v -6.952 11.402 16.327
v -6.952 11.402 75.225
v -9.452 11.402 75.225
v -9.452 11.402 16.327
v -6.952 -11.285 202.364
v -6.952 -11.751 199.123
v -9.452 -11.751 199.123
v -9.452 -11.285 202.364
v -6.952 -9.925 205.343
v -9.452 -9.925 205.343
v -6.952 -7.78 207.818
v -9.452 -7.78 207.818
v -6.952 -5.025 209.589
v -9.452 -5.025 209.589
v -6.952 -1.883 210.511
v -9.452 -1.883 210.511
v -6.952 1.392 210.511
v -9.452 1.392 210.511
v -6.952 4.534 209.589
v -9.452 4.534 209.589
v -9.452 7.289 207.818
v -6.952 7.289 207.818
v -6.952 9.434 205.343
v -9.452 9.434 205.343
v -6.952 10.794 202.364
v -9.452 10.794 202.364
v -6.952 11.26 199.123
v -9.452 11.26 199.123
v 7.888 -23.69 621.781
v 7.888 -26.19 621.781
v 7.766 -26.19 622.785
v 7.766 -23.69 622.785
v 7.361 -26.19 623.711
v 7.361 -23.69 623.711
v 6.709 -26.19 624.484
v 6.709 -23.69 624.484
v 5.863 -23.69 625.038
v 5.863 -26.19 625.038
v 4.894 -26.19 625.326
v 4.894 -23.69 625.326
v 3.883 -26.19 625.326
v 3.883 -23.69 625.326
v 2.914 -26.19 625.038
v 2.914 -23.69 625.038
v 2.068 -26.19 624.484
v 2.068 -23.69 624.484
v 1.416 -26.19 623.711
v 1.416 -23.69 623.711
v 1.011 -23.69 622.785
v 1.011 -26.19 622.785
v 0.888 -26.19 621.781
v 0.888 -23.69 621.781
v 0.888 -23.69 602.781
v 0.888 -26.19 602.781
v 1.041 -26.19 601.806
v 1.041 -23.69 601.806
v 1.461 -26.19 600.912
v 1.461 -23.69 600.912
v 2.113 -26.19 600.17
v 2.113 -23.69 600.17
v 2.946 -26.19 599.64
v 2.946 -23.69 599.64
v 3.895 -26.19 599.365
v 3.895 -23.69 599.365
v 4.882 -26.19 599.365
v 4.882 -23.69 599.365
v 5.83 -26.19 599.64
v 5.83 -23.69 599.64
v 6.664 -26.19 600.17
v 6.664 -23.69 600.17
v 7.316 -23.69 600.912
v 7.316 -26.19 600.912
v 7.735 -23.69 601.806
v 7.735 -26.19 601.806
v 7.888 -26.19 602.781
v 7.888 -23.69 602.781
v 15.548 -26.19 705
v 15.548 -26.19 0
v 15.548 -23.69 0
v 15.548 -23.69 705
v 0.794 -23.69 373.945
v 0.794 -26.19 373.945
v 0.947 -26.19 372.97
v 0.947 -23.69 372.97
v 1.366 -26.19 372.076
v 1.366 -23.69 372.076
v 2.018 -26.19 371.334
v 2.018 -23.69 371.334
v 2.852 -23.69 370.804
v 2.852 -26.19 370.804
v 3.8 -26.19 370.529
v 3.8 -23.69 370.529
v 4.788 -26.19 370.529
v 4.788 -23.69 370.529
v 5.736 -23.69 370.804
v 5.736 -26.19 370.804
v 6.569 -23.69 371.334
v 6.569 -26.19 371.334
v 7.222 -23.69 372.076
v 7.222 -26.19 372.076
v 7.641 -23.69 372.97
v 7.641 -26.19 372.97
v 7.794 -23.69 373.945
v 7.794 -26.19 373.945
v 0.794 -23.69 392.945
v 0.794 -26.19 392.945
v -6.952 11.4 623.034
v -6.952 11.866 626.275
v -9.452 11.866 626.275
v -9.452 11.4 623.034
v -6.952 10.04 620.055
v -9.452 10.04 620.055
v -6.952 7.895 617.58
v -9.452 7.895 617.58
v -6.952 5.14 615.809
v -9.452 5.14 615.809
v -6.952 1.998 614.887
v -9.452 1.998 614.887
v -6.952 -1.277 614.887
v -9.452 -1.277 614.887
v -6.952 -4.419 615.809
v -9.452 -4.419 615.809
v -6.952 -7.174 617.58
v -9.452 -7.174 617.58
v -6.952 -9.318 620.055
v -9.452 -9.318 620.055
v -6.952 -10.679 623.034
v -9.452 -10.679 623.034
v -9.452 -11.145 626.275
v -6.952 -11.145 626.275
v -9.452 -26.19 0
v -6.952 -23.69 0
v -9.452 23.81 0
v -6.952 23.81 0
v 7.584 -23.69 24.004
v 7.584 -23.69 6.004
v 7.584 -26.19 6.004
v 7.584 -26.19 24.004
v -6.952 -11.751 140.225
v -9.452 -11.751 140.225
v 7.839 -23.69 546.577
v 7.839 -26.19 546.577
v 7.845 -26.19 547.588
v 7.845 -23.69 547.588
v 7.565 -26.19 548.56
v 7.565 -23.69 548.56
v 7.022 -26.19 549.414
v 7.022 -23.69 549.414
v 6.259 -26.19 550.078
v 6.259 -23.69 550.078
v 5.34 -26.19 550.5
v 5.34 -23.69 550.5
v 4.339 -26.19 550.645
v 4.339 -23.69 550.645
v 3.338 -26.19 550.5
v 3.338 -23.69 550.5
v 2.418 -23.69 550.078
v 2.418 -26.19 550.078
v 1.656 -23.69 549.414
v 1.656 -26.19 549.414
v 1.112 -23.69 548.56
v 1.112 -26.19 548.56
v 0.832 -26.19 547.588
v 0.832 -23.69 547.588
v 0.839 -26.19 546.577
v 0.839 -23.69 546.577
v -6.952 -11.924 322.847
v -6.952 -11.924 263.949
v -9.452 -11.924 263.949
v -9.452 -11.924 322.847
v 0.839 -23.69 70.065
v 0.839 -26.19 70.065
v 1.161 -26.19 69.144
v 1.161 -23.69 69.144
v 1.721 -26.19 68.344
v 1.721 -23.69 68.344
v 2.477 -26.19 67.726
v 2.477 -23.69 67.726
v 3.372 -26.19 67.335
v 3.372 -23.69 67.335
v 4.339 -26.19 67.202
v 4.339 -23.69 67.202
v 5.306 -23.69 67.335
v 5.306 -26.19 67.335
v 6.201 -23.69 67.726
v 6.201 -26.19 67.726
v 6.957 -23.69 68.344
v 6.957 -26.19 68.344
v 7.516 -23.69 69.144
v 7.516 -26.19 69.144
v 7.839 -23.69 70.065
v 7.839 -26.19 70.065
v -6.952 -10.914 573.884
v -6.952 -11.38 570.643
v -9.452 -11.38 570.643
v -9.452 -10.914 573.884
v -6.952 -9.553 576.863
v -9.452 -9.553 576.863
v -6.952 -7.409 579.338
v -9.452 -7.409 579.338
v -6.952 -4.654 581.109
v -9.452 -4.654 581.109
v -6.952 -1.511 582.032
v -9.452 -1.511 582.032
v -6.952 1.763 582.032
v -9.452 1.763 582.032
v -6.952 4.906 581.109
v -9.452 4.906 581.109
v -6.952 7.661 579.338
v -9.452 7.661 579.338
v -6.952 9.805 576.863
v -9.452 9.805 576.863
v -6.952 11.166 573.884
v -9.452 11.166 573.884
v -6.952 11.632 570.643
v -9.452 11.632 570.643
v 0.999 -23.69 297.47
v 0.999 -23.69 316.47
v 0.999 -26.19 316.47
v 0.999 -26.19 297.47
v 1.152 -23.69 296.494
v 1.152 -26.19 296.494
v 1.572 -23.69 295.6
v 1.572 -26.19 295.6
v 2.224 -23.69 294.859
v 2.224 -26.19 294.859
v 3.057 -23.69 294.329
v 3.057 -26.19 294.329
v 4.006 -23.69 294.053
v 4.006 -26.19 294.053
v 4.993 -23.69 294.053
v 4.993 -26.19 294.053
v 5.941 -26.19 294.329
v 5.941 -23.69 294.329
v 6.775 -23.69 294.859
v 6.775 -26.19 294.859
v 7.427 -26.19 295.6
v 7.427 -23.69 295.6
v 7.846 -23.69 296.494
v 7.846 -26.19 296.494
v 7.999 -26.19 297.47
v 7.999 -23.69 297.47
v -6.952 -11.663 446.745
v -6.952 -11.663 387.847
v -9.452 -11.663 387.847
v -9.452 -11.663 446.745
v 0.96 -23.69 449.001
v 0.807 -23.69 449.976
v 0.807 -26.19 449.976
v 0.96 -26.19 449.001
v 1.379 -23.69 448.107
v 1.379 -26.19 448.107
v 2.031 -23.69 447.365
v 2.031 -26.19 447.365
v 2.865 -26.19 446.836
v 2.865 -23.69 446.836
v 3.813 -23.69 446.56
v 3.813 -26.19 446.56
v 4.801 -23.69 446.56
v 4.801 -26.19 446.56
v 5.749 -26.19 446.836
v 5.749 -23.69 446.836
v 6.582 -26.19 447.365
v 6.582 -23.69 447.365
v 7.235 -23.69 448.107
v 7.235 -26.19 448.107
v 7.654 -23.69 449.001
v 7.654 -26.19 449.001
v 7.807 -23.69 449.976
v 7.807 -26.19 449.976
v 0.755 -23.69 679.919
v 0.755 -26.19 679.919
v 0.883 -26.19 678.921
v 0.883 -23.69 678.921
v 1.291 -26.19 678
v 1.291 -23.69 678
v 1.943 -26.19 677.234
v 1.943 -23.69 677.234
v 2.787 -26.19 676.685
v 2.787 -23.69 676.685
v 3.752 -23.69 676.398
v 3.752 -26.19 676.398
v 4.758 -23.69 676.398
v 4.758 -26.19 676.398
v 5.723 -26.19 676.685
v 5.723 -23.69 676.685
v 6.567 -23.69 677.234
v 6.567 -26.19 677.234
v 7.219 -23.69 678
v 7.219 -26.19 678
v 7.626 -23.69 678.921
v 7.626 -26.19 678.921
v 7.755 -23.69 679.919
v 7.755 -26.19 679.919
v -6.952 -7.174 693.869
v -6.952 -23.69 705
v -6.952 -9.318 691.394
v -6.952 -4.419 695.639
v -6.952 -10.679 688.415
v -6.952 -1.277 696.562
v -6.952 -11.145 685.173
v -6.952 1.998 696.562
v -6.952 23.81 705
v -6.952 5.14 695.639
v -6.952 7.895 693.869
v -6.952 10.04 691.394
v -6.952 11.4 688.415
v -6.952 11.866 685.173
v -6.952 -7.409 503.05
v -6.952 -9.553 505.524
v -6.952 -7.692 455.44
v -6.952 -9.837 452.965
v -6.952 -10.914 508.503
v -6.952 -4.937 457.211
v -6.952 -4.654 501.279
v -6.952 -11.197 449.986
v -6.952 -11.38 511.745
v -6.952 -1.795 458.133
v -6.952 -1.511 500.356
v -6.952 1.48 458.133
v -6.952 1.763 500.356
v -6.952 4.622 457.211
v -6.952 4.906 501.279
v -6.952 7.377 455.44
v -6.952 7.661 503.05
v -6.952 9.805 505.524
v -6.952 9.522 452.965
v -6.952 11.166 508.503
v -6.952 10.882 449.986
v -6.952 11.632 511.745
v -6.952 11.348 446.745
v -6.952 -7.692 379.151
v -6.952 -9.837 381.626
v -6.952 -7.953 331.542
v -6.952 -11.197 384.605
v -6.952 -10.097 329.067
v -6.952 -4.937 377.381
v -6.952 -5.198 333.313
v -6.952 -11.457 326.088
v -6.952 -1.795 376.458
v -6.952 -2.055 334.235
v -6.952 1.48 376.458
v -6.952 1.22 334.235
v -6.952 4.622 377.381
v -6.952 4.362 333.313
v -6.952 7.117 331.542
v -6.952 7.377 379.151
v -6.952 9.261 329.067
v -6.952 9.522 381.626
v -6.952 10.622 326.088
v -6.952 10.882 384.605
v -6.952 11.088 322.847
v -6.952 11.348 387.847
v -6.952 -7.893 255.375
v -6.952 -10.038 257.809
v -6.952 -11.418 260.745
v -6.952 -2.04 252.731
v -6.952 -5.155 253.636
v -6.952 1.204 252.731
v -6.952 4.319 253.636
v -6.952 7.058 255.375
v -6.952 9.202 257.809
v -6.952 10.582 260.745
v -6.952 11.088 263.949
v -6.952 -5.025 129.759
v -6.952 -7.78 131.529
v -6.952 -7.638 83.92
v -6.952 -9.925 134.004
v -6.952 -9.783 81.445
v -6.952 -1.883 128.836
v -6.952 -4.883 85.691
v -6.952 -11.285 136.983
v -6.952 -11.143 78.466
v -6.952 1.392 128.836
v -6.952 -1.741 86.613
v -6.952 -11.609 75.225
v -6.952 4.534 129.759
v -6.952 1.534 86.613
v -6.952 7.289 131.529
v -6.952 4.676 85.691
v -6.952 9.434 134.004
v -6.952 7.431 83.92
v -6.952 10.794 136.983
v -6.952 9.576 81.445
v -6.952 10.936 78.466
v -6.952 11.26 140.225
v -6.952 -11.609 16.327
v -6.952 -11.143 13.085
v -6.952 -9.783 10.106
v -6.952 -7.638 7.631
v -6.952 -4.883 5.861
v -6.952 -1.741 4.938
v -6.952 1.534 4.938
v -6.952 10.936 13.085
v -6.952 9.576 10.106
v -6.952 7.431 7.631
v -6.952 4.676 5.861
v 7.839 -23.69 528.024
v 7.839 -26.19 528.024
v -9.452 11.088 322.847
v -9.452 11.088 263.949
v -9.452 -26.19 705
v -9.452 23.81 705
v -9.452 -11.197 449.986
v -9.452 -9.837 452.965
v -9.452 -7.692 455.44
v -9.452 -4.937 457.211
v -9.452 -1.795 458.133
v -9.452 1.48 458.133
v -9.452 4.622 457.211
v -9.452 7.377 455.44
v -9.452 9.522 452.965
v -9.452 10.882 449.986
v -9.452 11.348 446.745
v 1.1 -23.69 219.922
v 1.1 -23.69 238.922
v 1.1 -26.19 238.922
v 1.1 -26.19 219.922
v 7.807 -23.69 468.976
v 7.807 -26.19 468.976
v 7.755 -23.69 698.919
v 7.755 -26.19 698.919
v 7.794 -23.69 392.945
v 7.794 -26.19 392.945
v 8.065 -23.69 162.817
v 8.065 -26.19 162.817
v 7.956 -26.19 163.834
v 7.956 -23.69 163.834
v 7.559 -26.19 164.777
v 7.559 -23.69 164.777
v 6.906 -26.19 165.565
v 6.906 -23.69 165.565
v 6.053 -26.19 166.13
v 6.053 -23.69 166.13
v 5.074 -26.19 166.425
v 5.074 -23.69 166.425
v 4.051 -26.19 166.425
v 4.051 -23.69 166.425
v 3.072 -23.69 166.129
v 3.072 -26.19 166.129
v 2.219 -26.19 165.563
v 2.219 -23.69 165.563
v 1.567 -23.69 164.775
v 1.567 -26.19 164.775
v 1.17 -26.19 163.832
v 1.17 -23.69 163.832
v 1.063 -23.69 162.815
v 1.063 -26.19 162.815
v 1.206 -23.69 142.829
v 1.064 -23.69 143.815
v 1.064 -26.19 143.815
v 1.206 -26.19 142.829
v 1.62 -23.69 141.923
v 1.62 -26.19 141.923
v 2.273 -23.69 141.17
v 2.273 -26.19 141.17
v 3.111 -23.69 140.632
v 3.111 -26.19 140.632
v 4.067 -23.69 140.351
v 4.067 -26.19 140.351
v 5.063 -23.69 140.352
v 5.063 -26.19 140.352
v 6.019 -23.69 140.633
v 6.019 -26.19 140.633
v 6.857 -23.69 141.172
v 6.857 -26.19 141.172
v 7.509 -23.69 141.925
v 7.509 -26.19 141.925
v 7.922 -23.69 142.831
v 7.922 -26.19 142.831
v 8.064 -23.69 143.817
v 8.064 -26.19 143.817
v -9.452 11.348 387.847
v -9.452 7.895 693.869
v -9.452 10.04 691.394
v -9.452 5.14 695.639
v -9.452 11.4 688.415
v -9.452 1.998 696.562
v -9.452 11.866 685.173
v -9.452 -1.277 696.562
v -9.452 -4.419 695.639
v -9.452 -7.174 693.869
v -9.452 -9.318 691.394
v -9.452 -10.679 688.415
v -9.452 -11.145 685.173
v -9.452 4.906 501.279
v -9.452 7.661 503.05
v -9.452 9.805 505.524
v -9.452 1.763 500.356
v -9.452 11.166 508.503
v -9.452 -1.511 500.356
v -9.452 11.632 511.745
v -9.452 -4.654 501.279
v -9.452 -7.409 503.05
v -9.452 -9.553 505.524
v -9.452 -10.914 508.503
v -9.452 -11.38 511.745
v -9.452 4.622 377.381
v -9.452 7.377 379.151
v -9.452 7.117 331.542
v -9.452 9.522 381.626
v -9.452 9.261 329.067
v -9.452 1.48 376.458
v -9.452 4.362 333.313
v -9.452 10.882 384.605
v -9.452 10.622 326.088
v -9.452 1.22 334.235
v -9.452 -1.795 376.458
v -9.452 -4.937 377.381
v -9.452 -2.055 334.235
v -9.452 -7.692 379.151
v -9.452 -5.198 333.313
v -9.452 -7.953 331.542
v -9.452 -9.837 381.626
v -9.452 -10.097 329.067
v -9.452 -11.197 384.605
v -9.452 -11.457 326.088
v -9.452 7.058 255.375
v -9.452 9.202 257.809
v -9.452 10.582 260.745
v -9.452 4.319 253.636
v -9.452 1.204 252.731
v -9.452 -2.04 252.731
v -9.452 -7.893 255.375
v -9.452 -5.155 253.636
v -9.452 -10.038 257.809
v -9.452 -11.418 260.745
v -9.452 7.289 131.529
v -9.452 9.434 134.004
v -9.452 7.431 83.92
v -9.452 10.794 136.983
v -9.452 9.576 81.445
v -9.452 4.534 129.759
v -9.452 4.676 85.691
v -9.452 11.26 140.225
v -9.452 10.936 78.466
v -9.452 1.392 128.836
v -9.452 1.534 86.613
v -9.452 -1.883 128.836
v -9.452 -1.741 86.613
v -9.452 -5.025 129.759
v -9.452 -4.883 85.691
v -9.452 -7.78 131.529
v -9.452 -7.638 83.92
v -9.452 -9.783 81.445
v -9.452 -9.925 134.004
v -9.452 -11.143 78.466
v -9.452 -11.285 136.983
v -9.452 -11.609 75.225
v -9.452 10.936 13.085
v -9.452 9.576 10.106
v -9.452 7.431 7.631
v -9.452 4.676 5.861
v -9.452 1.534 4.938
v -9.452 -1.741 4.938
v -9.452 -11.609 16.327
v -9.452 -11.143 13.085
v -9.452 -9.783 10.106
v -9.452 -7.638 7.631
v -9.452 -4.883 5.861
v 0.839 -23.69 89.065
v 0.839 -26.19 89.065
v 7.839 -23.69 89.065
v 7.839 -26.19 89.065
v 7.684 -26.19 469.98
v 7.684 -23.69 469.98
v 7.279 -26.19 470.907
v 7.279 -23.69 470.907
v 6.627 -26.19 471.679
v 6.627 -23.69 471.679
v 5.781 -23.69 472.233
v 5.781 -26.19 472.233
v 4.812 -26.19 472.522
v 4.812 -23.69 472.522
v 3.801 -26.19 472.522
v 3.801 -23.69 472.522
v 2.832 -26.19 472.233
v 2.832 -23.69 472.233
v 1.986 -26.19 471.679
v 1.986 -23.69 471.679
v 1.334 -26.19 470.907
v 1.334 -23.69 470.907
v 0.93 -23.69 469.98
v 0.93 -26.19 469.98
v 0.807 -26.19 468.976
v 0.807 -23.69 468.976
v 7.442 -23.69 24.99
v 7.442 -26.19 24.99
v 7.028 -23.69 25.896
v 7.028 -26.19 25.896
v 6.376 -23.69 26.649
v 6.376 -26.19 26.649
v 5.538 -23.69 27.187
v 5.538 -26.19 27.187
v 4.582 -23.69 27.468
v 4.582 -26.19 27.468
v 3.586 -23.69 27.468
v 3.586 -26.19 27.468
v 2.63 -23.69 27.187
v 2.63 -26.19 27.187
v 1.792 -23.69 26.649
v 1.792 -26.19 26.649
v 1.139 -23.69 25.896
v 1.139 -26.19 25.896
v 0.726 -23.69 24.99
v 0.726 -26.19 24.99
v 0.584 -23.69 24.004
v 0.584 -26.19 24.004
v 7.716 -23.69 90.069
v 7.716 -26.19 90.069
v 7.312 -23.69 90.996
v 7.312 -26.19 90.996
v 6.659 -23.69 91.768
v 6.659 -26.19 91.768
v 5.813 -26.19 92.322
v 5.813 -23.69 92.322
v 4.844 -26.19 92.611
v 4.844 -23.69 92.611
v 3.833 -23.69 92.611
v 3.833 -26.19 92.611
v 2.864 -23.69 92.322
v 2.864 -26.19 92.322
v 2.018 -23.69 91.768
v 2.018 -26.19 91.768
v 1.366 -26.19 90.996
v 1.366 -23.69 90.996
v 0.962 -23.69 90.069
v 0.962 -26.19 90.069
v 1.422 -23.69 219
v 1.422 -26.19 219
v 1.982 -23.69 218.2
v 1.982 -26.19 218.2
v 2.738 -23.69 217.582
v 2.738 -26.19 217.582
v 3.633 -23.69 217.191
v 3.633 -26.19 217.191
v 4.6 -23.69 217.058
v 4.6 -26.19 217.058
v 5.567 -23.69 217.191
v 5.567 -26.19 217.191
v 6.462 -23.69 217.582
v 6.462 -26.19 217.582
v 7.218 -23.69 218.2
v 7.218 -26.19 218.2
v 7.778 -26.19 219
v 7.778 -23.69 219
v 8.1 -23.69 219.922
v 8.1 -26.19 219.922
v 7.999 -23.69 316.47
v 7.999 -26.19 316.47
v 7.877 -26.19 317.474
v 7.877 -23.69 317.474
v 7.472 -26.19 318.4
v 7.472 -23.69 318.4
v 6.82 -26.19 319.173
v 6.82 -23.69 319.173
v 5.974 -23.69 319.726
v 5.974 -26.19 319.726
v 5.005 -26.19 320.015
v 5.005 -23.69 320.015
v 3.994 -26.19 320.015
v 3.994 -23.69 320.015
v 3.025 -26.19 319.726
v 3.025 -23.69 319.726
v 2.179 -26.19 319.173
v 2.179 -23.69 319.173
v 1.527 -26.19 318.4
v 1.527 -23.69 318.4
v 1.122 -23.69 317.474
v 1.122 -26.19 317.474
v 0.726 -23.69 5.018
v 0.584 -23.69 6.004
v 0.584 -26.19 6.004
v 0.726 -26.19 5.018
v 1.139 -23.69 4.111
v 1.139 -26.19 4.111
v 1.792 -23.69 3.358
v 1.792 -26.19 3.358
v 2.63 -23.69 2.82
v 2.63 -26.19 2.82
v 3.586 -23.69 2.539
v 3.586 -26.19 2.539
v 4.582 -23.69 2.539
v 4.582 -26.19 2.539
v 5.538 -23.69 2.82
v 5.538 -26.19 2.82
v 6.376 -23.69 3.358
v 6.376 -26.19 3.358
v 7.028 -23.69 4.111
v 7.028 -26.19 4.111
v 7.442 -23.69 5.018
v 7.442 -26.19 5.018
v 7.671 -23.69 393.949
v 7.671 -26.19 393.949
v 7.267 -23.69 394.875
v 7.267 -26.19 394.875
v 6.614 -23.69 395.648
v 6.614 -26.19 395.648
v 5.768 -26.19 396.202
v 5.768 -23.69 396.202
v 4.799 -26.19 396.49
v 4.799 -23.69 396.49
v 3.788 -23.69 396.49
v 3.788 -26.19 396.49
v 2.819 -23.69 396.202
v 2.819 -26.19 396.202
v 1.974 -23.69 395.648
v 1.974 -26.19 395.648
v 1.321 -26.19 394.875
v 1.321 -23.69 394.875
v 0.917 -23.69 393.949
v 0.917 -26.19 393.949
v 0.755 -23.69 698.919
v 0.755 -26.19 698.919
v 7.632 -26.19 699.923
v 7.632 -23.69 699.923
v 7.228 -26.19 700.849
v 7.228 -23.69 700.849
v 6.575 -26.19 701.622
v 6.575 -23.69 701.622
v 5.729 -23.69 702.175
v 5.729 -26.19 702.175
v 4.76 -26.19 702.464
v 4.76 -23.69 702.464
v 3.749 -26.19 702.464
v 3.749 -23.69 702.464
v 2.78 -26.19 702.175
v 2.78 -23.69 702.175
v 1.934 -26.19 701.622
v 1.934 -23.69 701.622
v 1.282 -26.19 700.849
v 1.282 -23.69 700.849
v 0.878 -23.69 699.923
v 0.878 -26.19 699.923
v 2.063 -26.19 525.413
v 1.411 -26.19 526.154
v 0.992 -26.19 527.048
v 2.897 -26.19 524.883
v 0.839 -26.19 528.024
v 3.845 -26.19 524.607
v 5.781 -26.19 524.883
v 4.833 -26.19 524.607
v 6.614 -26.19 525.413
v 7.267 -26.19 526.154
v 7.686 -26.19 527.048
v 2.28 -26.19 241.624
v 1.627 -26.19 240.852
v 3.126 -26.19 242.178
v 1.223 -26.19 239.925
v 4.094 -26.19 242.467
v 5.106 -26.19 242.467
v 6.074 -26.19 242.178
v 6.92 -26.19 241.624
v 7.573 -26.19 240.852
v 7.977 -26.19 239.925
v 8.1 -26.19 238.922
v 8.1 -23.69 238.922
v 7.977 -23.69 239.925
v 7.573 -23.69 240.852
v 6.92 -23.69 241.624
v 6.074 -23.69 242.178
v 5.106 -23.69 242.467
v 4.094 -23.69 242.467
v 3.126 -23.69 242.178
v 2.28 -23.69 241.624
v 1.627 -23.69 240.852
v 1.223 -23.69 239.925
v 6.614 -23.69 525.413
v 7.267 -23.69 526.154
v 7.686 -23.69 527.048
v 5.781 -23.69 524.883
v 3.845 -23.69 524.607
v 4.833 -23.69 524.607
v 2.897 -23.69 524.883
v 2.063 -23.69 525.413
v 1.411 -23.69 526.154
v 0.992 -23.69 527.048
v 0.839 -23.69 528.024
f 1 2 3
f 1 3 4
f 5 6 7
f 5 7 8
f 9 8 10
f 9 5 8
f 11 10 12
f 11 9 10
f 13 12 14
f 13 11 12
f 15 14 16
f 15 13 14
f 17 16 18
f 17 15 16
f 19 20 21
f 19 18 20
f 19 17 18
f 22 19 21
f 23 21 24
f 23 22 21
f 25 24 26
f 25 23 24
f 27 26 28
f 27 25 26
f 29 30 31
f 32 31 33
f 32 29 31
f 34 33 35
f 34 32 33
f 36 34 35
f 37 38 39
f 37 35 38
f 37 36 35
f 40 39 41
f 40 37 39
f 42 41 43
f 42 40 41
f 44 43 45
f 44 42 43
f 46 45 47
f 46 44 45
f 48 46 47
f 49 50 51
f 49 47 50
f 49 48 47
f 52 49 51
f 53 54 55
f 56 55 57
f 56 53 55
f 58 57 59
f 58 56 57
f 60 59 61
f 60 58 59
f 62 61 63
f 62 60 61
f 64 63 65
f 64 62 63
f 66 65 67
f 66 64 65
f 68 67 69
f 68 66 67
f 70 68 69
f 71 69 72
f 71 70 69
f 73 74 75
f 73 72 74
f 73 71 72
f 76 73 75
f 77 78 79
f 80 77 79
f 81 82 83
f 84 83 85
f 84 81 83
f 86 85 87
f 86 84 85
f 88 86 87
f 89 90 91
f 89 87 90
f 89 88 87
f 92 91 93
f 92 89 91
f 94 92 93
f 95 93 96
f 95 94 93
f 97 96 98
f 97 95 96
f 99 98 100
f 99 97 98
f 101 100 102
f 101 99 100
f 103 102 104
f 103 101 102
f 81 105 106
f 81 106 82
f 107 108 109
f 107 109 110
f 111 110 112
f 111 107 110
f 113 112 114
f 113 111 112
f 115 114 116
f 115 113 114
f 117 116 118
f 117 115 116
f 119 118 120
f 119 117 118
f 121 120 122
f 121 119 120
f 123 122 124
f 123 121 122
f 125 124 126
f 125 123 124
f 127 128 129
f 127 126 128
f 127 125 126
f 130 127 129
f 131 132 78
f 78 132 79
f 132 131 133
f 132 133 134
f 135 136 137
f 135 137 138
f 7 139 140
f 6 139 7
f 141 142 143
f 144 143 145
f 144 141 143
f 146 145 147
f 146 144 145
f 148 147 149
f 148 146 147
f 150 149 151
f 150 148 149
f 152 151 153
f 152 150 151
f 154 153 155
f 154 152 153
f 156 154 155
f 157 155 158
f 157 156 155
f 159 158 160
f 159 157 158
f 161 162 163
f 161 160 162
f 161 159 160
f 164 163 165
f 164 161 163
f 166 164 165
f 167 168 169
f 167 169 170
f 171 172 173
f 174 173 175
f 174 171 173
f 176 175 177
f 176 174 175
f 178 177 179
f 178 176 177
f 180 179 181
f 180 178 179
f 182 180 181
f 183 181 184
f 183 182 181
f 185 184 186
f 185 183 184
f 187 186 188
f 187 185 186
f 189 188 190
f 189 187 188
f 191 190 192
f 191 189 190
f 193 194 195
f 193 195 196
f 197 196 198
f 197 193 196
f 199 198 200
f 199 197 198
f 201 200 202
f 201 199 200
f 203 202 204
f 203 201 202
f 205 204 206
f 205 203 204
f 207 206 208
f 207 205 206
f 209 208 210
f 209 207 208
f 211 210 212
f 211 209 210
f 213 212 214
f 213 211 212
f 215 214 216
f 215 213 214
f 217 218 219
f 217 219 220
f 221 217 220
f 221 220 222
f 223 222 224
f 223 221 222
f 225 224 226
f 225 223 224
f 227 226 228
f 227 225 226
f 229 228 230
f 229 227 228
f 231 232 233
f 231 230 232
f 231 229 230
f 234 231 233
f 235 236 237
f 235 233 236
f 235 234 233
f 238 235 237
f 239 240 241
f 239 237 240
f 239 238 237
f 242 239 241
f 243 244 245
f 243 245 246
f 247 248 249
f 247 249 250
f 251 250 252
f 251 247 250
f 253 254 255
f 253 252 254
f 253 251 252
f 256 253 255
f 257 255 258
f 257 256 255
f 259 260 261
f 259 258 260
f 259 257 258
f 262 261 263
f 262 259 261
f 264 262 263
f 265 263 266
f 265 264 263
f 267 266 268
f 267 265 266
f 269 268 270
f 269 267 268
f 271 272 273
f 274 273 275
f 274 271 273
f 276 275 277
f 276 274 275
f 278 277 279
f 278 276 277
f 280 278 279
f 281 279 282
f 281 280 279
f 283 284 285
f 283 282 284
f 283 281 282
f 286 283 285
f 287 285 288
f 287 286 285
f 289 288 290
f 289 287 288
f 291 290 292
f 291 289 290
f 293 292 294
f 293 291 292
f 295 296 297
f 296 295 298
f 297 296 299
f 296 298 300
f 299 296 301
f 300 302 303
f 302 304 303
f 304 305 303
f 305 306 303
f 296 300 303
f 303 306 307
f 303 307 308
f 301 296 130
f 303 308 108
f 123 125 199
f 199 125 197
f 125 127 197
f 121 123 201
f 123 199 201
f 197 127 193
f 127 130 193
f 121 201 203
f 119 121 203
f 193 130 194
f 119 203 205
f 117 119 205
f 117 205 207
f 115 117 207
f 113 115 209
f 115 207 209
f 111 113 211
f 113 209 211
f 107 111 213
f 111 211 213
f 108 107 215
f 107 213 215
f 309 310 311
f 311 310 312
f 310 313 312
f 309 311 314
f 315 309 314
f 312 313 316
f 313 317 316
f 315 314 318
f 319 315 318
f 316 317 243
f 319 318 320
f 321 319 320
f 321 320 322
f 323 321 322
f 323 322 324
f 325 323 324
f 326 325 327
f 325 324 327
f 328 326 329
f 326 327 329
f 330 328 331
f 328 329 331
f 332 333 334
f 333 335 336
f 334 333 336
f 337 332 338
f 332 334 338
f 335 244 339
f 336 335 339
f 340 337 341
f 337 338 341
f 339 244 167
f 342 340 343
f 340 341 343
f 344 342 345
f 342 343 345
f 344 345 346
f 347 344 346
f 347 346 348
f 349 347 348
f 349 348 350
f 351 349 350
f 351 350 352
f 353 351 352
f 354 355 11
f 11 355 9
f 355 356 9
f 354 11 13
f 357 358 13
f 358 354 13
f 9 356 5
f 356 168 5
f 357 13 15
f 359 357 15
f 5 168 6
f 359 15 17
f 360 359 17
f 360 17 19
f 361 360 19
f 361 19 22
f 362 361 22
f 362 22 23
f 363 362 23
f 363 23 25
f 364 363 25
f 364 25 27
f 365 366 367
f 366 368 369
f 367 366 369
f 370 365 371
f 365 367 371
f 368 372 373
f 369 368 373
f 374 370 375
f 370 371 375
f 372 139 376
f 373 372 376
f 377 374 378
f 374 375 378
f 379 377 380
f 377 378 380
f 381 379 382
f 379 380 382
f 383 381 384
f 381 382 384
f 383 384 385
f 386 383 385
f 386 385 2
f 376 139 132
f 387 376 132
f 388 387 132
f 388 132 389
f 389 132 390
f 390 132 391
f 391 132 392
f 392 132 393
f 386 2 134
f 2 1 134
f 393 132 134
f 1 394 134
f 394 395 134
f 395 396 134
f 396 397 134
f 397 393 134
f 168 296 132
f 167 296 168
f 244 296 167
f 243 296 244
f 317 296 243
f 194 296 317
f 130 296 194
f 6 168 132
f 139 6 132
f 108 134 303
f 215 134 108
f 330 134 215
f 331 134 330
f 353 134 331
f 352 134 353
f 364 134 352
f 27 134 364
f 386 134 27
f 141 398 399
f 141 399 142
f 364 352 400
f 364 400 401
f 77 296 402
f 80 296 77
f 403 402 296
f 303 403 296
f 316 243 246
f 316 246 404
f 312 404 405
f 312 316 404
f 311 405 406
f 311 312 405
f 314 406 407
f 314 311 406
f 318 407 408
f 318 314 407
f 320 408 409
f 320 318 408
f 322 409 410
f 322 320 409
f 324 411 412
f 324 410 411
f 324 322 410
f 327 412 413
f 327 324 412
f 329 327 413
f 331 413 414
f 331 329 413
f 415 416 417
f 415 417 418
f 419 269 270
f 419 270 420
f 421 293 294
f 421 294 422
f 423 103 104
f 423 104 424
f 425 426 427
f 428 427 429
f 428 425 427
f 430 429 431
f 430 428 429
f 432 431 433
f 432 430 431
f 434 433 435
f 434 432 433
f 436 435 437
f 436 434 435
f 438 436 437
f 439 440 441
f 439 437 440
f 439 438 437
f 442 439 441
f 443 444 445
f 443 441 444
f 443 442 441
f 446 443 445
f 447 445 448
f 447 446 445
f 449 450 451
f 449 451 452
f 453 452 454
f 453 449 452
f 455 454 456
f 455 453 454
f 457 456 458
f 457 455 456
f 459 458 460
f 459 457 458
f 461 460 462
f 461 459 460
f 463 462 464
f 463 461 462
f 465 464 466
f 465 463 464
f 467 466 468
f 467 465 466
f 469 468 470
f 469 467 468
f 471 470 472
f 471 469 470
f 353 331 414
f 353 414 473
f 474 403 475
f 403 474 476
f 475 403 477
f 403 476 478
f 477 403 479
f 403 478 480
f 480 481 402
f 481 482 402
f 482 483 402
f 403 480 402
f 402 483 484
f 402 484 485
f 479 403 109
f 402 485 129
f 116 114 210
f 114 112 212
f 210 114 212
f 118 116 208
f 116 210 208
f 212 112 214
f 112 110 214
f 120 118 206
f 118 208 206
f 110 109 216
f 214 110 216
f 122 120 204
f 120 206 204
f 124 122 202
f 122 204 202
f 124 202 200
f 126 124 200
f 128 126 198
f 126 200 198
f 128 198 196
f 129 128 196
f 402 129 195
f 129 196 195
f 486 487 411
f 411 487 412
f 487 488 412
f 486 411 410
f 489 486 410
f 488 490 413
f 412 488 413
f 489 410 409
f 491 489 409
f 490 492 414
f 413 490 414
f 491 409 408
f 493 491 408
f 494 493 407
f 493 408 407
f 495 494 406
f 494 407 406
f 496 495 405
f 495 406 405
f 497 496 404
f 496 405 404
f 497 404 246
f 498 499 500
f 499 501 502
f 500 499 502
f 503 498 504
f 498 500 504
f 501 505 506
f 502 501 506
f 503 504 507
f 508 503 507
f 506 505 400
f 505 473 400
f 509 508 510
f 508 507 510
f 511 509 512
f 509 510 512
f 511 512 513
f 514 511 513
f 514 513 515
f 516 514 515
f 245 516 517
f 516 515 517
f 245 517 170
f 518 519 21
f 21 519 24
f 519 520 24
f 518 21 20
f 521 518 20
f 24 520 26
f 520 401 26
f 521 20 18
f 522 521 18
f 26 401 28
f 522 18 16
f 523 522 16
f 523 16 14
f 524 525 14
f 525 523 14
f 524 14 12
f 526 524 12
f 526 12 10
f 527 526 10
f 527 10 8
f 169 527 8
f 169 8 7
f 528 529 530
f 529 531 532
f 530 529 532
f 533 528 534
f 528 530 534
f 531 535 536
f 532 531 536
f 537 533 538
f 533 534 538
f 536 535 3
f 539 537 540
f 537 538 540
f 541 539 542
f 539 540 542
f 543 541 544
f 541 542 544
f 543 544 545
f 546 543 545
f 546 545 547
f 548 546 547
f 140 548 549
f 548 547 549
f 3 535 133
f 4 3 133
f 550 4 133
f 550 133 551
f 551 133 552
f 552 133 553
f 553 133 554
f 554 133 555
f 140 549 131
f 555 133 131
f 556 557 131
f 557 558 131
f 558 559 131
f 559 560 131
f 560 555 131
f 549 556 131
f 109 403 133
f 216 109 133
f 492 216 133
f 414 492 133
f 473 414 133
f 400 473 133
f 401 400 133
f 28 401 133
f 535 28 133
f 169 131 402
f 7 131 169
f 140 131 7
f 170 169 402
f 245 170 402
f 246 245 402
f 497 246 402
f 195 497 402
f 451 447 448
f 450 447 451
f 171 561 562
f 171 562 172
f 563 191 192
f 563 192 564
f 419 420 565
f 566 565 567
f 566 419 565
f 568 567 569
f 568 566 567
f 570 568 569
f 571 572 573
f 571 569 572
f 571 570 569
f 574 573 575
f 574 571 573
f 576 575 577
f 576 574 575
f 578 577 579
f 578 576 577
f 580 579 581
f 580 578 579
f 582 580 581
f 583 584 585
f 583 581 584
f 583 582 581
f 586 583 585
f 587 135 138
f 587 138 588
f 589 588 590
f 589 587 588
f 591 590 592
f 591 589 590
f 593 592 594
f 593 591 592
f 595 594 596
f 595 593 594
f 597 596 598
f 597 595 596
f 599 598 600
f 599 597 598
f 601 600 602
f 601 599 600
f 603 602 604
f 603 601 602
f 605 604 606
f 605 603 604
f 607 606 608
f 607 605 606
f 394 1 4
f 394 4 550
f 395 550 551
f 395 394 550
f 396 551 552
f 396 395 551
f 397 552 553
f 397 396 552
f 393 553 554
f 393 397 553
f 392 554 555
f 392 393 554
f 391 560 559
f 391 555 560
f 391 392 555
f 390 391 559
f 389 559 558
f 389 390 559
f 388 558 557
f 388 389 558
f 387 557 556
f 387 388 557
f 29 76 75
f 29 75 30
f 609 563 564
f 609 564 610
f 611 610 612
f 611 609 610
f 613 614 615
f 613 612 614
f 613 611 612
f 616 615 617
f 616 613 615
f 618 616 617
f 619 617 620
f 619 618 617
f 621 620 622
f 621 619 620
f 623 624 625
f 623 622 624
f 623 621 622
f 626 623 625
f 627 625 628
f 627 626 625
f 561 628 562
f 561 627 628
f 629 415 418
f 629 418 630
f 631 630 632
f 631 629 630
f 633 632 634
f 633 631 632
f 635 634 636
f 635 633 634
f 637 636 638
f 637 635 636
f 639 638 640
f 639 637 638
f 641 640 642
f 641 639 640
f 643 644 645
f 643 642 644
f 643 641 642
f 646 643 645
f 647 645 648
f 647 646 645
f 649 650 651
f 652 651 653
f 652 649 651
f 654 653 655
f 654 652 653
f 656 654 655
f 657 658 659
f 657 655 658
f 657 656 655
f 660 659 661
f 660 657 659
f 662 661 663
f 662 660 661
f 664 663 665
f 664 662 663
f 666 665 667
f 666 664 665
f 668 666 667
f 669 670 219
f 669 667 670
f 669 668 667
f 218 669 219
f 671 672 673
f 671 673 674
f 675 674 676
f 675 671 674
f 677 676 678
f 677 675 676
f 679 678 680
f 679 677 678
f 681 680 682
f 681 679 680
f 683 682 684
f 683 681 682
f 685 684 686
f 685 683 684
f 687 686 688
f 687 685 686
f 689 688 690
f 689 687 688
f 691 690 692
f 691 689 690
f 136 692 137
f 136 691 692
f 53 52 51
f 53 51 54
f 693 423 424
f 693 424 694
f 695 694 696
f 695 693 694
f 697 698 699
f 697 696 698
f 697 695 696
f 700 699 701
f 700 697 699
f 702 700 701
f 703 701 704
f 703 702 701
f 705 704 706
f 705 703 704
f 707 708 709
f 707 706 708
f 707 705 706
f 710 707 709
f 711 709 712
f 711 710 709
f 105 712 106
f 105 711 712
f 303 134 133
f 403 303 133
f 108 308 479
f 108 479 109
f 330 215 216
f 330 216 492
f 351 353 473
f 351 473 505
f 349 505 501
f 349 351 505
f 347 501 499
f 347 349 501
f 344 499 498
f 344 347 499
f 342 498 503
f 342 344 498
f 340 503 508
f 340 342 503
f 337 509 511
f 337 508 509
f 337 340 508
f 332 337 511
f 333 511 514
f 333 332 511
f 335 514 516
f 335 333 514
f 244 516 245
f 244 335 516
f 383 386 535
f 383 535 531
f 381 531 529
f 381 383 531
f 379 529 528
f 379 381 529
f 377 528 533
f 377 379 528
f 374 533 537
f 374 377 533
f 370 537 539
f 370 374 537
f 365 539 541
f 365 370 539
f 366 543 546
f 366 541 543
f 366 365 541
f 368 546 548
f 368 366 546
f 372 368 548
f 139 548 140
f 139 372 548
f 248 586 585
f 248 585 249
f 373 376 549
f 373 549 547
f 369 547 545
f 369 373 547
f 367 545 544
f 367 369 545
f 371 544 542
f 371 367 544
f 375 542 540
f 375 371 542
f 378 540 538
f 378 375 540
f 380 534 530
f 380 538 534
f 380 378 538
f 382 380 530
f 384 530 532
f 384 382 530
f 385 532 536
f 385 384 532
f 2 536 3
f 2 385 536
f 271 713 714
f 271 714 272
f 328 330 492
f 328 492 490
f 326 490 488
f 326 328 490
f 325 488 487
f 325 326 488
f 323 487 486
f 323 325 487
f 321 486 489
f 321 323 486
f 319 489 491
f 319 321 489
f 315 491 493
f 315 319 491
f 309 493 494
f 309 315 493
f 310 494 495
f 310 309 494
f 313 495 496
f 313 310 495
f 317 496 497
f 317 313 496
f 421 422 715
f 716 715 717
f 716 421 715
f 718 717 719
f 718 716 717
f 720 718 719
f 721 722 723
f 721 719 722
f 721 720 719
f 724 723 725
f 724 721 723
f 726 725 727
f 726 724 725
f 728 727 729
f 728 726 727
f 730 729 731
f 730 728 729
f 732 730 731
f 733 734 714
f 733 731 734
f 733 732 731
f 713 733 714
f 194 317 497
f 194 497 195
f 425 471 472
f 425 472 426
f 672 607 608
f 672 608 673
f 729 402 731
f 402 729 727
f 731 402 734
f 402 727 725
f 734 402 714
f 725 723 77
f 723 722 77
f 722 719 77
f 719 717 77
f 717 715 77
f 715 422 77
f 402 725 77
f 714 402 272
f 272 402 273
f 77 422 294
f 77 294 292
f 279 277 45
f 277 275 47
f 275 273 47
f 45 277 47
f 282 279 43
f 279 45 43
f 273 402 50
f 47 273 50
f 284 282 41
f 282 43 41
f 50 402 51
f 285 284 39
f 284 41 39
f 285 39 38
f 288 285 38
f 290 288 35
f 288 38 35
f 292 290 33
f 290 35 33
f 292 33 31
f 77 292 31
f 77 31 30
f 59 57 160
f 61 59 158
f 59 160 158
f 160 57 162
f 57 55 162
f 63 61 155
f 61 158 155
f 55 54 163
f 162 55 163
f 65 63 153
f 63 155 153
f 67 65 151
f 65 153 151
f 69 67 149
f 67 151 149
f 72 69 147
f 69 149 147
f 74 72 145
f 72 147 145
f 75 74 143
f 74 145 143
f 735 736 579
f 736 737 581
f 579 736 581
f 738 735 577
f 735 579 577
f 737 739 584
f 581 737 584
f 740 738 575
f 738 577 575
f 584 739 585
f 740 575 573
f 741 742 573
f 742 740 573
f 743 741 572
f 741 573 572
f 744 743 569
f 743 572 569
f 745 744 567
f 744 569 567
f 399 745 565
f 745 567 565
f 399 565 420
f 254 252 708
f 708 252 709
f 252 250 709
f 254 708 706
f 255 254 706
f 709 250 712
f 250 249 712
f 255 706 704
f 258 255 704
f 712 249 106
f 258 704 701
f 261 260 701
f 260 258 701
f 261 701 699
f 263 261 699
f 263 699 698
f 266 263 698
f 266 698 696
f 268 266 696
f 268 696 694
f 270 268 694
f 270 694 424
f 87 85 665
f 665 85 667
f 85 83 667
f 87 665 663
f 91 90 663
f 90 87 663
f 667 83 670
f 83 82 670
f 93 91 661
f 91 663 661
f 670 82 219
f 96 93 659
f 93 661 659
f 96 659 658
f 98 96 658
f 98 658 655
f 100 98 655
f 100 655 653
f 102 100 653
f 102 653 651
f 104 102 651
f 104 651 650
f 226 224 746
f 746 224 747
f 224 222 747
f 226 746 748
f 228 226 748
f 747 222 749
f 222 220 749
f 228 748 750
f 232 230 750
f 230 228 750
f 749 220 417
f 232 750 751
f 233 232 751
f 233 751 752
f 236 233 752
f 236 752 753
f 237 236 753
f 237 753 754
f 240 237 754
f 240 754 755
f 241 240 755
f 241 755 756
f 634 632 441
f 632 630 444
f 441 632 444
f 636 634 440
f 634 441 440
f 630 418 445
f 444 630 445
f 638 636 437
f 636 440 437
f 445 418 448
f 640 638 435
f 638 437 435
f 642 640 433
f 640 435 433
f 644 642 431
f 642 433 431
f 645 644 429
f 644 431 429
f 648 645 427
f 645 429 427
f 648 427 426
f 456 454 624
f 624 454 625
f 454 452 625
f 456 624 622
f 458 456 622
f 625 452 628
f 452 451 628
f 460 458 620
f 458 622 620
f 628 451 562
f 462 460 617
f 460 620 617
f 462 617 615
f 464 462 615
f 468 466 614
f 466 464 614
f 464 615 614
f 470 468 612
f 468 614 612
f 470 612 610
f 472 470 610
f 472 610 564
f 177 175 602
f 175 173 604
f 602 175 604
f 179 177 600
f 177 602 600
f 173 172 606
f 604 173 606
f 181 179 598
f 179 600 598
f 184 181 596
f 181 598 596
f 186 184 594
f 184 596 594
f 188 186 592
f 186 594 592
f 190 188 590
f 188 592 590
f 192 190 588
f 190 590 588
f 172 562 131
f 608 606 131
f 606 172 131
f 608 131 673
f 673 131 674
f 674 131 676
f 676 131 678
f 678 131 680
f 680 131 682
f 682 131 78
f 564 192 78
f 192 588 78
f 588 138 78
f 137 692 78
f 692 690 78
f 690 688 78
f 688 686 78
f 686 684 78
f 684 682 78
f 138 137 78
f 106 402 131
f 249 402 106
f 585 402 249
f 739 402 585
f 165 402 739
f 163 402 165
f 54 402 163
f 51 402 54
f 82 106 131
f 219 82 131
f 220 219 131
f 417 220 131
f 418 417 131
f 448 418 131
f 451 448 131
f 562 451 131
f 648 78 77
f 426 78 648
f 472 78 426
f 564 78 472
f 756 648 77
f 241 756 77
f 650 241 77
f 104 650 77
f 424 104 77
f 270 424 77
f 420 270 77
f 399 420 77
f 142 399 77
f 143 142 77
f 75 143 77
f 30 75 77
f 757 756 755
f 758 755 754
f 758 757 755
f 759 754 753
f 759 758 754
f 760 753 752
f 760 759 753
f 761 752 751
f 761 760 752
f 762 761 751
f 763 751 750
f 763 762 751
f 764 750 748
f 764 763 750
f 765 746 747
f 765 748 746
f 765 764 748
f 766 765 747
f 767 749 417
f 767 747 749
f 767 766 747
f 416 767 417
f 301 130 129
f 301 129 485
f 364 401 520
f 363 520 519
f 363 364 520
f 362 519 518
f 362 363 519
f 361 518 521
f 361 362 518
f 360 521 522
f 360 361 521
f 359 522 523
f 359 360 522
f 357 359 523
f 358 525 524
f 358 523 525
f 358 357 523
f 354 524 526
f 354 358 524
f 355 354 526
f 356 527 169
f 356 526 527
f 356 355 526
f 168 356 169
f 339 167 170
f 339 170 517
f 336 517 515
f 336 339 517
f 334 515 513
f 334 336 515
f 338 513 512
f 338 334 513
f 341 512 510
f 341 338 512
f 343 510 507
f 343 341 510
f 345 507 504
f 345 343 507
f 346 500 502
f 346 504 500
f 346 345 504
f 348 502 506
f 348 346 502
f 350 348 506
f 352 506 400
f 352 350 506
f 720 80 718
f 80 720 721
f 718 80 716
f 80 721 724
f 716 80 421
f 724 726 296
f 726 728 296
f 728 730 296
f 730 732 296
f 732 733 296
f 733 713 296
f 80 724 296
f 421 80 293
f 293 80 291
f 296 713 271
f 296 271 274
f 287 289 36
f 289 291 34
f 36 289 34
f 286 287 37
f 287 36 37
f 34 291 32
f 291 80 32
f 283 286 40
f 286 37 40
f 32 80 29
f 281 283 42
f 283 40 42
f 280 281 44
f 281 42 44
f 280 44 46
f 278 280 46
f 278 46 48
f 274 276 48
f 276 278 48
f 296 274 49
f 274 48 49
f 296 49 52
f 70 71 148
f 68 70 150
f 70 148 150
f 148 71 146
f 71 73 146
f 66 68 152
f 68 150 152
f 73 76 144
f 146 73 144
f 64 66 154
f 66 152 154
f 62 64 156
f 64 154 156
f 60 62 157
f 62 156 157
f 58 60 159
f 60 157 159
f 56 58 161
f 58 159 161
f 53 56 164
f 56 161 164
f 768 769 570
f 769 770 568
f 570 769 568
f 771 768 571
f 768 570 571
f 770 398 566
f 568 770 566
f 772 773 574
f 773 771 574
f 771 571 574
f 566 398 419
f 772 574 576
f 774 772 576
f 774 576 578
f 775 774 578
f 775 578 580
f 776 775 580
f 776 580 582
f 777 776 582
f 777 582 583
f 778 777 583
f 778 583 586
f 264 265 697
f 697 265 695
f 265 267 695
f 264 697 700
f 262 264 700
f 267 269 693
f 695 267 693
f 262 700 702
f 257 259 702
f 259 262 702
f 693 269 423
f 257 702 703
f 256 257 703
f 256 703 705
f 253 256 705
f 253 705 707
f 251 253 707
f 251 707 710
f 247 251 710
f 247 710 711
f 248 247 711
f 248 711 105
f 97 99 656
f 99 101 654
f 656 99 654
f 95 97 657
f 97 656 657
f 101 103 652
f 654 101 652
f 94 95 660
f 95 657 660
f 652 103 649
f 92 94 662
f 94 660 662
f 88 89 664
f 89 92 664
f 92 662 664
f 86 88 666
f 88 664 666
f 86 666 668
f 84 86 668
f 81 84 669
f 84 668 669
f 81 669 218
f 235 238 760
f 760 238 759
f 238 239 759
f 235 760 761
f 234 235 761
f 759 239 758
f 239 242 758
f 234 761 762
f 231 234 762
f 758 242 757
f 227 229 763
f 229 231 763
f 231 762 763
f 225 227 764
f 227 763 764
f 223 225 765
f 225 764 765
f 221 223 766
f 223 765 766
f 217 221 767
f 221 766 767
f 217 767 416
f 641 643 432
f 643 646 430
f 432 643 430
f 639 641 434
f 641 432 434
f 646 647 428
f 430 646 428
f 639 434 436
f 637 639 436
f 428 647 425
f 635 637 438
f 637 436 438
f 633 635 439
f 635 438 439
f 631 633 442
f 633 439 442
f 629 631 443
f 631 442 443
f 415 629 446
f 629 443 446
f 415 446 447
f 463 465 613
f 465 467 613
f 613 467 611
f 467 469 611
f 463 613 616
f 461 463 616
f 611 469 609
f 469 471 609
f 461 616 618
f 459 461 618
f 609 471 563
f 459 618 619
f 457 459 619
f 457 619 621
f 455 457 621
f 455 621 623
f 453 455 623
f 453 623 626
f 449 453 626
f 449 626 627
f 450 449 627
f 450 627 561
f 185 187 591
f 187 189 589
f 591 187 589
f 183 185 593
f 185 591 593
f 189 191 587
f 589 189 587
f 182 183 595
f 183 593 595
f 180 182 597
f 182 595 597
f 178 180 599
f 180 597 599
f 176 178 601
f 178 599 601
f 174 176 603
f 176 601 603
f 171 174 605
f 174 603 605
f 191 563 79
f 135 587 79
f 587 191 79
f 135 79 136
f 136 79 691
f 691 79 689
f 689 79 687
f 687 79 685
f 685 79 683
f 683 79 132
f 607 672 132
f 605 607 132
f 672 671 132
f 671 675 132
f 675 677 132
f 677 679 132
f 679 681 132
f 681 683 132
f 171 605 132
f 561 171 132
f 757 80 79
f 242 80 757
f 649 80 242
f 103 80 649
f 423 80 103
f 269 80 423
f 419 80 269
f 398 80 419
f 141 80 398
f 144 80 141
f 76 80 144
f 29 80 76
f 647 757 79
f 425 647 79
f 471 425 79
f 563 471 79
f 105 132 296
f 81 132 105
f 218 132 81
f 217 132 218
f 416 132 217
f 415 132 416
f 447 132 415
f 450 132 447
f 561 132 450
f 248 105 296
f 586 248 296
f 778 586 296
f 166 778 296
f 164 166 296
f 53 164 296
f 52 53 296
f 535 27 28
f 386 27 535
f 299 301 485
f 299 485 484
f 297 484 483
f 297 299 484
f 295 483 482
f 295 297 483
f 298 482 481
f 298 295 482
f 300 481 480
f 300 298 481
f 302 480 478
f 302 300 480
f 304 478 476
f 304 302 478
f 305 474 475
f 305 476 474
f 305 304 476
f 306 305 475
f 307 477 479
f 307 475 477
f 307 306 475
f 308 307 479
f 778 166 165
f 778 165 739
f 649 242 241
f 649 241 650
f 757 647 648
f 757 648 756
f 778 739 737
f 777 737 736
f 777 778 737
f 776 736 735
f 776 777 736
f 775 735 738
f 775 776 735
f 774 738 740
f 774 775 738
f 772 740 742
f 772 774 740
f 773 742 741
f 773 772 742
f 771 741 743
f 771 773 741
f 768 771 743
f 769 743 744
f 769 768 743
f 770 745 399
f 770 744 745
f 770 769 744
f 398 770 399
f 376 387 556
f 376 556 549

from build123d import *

# Parameters (mm, degrees)
BOSS_EXTRUDE1_DEPTH = 705
CUT_EXTRUDE2_DEPTH  = 10
CUT_EXTRUDE3_DEPTH  = 10


with BuildPart() as part:
    # Sketch1 → Boss-Extrude1 (new body)
    with BuildSketch(Plane.XY):
        Polygon((-9.451520251, 23.80952381), (-9.451520251, -26.19047619), (15.548479749, -26.19047619), (15.548479749, -23.69047619), (-6.951520251, -23.69047619), (-6.951520251, 23.80952381), align=None)
    extrude(amount=BOSS_EXTRUDE1_DEPTH)

    # Sketch3 → Cut-Extrude2 (cut)
    with BuildSketch(Plane(origin=(0, -23.69047619, 0), x_dir=(1, 0, 0), z_dir=(0, 1, 0))):
        with BuildLine():
            Line((1.100010518, -238.921557585), (1.100010518, -219.921557585))
            ThreePointArc((1.100010518, -219.921557585), (4.600010518, -217.057732255), (8.100010518, -219.921557585))
            Line((8.100010518, -219.921557585), (8.100010518, -238.921557585))
            ThreePointArc((8.100010518, -238.921557585), (4.600010518, -242.50349619), (1.100010518, -238.921557585))
        make_face()
        with BuildLine():
            Line((1.062751019, -162.814659823), (1.06366359, -143.814659845))
            ThreePointArc((1.06366359, -143.814659845), (4.564952106, -140.315948836), (8.063663115, -143.817237352))
            Line((8.063663115, -143.817237352), (8.064681771, -162.817237325))
            ThreePointArc((8.064681771, -162.817237325), (4.562374007, -166.462622847), (1.062751019, -162.814659823))
        make_face()
        with BuildLine():
            Line((0.583868221, -24.003598612), (0.583868221, -6.003598612))
            ThreePointArc((0.583868221, -6.003598612), (4.083868221, -2.503598612), (7.583868221, -6.003598612))
            Line((7.583868221, -6.003598612), (7.583868221, -24.003598612))
            ThreePointArc((7.583868221, -24.003598612), (4.083868221, -27.503598612), (0.583868221, -24.003598612))
        make_face()
        with BuildLine():
            Line((0.999318179, -316.46999614), (0.999318179, -297.46999614))
            ThreePointArc((0.999318179, -297.46999614), (4.499318179, -294.01841185), (7.999318179, -297.46999614))
            Line((7.999318179, -297.46999614), (7.999318179, -316.46999614))
            ThreePointArc((7.999318179, -316.46999614), (4.499318179, -320.051934745), (0.999318179, -316.46999614))
        make_face()
        with BuildLine():
            Line((0.793870885, -392.945206895), (0.793870885, -373.945206895))
            ThreePointArc((0.793870885, -373.945206895), (4.293870885, -370.493622604), (7.793870885, -373.945206895))
            Line((7.793870885, -373.945206895), (7.793870885, -392.945206895))
            ThreePointArc((7.793870885, -392.945206895), (4.293870885, -396.527145499), (0.793870885, -392.945206895))
        make_face()
        with BuildLine():
            Line((0.80674983, -468.976356015), (0.80674983, -449.976356015))
            ThreePointArc((0.80674983, -449.976356015), (4.30674983, -446.524771725), (7.80674983, -449.976356015))
            Line((7.80674983, -449.976356015), (7.80674983, -468.976356015))
            ThreePointArc((7.80674983, -468.976356015), (4.30674983, -472.55829462), (0.80674983, -468.976356015))
        make_face()
        with BuildLine():
            Line((0.838773895, -546.576842351), (0.838773895, -528.023898071))
            ThreePointArc((0.838773895, -528.023898071), (4.338773895, -524.572313781), (7.838773895, -528.023898071))
            Line((7.838773895, -528.023898071), (7.838773895, -546.576842351))
            ThreePointArc((7.838773895, -546.576842351), (4.338773895, -550.644510243), (0.838773895, -546.576842351))
        make_face()
        with BuildLine():
            Line((0.888336666, -621.781220279), (0.888336666, -602.781220279))
            ThreePointArc((0.888336666, -602.781220279), (4.388336666, -599.329635989), (7.888336666, -602.781220279))
            Line((7.888336666, -602.781220279), (7.888336666, -621.781220279))
            ThreePointArc((7.888336666, -621.781220279), (4.388336666, -625.363158884), (0.888336666, -621.781220279))
        make_face()
        with BuildLine():
            Line((0.754778841, -698.918998588), (0.754778841, -679.918998588))
            ThreePointArc((0.754778841, -679.918998588), (4.254778841, -676.361761205), (7.754778841, -679.918998588))
            Line((7.754778841, -679.918998588), (7.754778841, -698.918998588))
            ThreePointArc((7.754778841, -698.918998588), (4.254778841, -702.500937193), (0.754778841, -698.918998588))
        make_face()
        with BuildLine():
            Line((0.838792542, -89.065486865), (0.838792542, -70.065486865))
            ThreePointArc((0.838792542, -70.065486865), (4.338792542, -67.201661534), (7.838792542, -70.065486865))
            Line((7.838792542, -70.065486865), (7.838792542, -89.065486865))
            ThreePointArc((7.838792542, -89.065486865), (4.338792542, -92.647425469), (0.838792542, -89.065486865))
        make_face()
    extrude(amount=-CUT_EXTRUDE2_DEPTH, mode=Mode.SUBTRACT)

    # Sketch2 → Cut-Extrude3 (cut)
    with BuildSketch(Plane(origin=(-6.951520251, 0, 0), x_dir=(0, 0, -1), z_dir=(1, 0, 0))):
        with BuildLine():
            Line((-685.173208755, 11.86647277), (-626.275157977, 11.86647277))
            ThreePointArc((-626.275157977, 11.86647277), (-614.769492243, 0.360807036), (-626.275157977, -11.144858697))
            Line((-626.275157977, -11.144858697), (-685.173208755, -11.144858697))
            ThreePointArc((-685.173208755, -11.144858697), (-696.678874489, 0.360807036), (-685.173208755, 11.86647277))
        make_face()
        with BuildLine():
            Line((-570.642955191, 11.631729837), (-511.744904413, 11.631729837))
            ThreePointArc((-511.744904413, 11.631729837), (-500.239238679, 0.126064103), (-511.744904413, -11.379601631))
            Line((-511.744904413, -11.379601631), (-570.642955191, -11.379601631))
            ThreePointArc((-570.642955191, -11.379601631), (-582.148620925, 0.126064103), (-570.642955191, 11.631729837))
        make_face()
        with BuildLine():
            Line((-446.744904413, 11.34825395), (-387.846853634, 11.34825395))
            ThreePointArc((-387.846853634, 11.34825395), (-376.3411879, -0.157411783), (-387.846853634, -11.663077517))
            Line((-387.846853634, -11.663077517), (-446.744904413, -11.663077517))
            ThreePointArc((-446.744904413, -11.663077517), (-458.250570146, -0.157411783), (-446.744904413, 11.34825395))
        make_face()
        with BuildLine():
            Line((-322.846853634, 11.087774361), (-263.948802855, 11.087774361))
            ThreePointArc((-263.948802855, 11.087774361), (-252.615852555, -0.417891372), (-263.948802855, -11.923557106))
            Line((-263.948802855, -11.923557106), (-322.846853634, -11.923557106))
            ThreePointArc((-322.846853634, -11.923557106), (-334.352519367, -0.417891372), (-322.846853634, 11.087774361))
        make_face()
        with BuildLine():
            Line((-199.12283439, 11.260273997), (-140.224783611, 11.260273997))
            ThreePointArc((-140.224783611, 11.260273997), (-128.719117878, -0.245391736), (-140.224783611, -11.75105747))
            Line((-140.224783611, -11.75105747), (-199.12283439, -11.75105747))
            ThreePointArc((-199.12283439, -11.75105747), (-210.628500124, -0.245391736), (-199.12283439, 11.260273997))
        make_face()
        with BuildLine():
            Line((-75.224783611, 11.402162448), (-16.326732833, 11.402162448))
            ThreePointArc((-16.326732833, 11.402162448), (-4.821067099, -0.103503285), (-16.326732833, -11.609169019))
            Line((-16.326732833, -11.609169019), (-75.224783611, -11.609169019))
            ThreePointArc((-75.224783611, -11.609169019), (-86.730449345, -0.103503285), (-75.224783611, 11.402162448))
        make_face()
    extrude(amount=-CUT_EXTRUDE3_DEPTH, mode=Mode.SUBTRACT)


solid = part.part
